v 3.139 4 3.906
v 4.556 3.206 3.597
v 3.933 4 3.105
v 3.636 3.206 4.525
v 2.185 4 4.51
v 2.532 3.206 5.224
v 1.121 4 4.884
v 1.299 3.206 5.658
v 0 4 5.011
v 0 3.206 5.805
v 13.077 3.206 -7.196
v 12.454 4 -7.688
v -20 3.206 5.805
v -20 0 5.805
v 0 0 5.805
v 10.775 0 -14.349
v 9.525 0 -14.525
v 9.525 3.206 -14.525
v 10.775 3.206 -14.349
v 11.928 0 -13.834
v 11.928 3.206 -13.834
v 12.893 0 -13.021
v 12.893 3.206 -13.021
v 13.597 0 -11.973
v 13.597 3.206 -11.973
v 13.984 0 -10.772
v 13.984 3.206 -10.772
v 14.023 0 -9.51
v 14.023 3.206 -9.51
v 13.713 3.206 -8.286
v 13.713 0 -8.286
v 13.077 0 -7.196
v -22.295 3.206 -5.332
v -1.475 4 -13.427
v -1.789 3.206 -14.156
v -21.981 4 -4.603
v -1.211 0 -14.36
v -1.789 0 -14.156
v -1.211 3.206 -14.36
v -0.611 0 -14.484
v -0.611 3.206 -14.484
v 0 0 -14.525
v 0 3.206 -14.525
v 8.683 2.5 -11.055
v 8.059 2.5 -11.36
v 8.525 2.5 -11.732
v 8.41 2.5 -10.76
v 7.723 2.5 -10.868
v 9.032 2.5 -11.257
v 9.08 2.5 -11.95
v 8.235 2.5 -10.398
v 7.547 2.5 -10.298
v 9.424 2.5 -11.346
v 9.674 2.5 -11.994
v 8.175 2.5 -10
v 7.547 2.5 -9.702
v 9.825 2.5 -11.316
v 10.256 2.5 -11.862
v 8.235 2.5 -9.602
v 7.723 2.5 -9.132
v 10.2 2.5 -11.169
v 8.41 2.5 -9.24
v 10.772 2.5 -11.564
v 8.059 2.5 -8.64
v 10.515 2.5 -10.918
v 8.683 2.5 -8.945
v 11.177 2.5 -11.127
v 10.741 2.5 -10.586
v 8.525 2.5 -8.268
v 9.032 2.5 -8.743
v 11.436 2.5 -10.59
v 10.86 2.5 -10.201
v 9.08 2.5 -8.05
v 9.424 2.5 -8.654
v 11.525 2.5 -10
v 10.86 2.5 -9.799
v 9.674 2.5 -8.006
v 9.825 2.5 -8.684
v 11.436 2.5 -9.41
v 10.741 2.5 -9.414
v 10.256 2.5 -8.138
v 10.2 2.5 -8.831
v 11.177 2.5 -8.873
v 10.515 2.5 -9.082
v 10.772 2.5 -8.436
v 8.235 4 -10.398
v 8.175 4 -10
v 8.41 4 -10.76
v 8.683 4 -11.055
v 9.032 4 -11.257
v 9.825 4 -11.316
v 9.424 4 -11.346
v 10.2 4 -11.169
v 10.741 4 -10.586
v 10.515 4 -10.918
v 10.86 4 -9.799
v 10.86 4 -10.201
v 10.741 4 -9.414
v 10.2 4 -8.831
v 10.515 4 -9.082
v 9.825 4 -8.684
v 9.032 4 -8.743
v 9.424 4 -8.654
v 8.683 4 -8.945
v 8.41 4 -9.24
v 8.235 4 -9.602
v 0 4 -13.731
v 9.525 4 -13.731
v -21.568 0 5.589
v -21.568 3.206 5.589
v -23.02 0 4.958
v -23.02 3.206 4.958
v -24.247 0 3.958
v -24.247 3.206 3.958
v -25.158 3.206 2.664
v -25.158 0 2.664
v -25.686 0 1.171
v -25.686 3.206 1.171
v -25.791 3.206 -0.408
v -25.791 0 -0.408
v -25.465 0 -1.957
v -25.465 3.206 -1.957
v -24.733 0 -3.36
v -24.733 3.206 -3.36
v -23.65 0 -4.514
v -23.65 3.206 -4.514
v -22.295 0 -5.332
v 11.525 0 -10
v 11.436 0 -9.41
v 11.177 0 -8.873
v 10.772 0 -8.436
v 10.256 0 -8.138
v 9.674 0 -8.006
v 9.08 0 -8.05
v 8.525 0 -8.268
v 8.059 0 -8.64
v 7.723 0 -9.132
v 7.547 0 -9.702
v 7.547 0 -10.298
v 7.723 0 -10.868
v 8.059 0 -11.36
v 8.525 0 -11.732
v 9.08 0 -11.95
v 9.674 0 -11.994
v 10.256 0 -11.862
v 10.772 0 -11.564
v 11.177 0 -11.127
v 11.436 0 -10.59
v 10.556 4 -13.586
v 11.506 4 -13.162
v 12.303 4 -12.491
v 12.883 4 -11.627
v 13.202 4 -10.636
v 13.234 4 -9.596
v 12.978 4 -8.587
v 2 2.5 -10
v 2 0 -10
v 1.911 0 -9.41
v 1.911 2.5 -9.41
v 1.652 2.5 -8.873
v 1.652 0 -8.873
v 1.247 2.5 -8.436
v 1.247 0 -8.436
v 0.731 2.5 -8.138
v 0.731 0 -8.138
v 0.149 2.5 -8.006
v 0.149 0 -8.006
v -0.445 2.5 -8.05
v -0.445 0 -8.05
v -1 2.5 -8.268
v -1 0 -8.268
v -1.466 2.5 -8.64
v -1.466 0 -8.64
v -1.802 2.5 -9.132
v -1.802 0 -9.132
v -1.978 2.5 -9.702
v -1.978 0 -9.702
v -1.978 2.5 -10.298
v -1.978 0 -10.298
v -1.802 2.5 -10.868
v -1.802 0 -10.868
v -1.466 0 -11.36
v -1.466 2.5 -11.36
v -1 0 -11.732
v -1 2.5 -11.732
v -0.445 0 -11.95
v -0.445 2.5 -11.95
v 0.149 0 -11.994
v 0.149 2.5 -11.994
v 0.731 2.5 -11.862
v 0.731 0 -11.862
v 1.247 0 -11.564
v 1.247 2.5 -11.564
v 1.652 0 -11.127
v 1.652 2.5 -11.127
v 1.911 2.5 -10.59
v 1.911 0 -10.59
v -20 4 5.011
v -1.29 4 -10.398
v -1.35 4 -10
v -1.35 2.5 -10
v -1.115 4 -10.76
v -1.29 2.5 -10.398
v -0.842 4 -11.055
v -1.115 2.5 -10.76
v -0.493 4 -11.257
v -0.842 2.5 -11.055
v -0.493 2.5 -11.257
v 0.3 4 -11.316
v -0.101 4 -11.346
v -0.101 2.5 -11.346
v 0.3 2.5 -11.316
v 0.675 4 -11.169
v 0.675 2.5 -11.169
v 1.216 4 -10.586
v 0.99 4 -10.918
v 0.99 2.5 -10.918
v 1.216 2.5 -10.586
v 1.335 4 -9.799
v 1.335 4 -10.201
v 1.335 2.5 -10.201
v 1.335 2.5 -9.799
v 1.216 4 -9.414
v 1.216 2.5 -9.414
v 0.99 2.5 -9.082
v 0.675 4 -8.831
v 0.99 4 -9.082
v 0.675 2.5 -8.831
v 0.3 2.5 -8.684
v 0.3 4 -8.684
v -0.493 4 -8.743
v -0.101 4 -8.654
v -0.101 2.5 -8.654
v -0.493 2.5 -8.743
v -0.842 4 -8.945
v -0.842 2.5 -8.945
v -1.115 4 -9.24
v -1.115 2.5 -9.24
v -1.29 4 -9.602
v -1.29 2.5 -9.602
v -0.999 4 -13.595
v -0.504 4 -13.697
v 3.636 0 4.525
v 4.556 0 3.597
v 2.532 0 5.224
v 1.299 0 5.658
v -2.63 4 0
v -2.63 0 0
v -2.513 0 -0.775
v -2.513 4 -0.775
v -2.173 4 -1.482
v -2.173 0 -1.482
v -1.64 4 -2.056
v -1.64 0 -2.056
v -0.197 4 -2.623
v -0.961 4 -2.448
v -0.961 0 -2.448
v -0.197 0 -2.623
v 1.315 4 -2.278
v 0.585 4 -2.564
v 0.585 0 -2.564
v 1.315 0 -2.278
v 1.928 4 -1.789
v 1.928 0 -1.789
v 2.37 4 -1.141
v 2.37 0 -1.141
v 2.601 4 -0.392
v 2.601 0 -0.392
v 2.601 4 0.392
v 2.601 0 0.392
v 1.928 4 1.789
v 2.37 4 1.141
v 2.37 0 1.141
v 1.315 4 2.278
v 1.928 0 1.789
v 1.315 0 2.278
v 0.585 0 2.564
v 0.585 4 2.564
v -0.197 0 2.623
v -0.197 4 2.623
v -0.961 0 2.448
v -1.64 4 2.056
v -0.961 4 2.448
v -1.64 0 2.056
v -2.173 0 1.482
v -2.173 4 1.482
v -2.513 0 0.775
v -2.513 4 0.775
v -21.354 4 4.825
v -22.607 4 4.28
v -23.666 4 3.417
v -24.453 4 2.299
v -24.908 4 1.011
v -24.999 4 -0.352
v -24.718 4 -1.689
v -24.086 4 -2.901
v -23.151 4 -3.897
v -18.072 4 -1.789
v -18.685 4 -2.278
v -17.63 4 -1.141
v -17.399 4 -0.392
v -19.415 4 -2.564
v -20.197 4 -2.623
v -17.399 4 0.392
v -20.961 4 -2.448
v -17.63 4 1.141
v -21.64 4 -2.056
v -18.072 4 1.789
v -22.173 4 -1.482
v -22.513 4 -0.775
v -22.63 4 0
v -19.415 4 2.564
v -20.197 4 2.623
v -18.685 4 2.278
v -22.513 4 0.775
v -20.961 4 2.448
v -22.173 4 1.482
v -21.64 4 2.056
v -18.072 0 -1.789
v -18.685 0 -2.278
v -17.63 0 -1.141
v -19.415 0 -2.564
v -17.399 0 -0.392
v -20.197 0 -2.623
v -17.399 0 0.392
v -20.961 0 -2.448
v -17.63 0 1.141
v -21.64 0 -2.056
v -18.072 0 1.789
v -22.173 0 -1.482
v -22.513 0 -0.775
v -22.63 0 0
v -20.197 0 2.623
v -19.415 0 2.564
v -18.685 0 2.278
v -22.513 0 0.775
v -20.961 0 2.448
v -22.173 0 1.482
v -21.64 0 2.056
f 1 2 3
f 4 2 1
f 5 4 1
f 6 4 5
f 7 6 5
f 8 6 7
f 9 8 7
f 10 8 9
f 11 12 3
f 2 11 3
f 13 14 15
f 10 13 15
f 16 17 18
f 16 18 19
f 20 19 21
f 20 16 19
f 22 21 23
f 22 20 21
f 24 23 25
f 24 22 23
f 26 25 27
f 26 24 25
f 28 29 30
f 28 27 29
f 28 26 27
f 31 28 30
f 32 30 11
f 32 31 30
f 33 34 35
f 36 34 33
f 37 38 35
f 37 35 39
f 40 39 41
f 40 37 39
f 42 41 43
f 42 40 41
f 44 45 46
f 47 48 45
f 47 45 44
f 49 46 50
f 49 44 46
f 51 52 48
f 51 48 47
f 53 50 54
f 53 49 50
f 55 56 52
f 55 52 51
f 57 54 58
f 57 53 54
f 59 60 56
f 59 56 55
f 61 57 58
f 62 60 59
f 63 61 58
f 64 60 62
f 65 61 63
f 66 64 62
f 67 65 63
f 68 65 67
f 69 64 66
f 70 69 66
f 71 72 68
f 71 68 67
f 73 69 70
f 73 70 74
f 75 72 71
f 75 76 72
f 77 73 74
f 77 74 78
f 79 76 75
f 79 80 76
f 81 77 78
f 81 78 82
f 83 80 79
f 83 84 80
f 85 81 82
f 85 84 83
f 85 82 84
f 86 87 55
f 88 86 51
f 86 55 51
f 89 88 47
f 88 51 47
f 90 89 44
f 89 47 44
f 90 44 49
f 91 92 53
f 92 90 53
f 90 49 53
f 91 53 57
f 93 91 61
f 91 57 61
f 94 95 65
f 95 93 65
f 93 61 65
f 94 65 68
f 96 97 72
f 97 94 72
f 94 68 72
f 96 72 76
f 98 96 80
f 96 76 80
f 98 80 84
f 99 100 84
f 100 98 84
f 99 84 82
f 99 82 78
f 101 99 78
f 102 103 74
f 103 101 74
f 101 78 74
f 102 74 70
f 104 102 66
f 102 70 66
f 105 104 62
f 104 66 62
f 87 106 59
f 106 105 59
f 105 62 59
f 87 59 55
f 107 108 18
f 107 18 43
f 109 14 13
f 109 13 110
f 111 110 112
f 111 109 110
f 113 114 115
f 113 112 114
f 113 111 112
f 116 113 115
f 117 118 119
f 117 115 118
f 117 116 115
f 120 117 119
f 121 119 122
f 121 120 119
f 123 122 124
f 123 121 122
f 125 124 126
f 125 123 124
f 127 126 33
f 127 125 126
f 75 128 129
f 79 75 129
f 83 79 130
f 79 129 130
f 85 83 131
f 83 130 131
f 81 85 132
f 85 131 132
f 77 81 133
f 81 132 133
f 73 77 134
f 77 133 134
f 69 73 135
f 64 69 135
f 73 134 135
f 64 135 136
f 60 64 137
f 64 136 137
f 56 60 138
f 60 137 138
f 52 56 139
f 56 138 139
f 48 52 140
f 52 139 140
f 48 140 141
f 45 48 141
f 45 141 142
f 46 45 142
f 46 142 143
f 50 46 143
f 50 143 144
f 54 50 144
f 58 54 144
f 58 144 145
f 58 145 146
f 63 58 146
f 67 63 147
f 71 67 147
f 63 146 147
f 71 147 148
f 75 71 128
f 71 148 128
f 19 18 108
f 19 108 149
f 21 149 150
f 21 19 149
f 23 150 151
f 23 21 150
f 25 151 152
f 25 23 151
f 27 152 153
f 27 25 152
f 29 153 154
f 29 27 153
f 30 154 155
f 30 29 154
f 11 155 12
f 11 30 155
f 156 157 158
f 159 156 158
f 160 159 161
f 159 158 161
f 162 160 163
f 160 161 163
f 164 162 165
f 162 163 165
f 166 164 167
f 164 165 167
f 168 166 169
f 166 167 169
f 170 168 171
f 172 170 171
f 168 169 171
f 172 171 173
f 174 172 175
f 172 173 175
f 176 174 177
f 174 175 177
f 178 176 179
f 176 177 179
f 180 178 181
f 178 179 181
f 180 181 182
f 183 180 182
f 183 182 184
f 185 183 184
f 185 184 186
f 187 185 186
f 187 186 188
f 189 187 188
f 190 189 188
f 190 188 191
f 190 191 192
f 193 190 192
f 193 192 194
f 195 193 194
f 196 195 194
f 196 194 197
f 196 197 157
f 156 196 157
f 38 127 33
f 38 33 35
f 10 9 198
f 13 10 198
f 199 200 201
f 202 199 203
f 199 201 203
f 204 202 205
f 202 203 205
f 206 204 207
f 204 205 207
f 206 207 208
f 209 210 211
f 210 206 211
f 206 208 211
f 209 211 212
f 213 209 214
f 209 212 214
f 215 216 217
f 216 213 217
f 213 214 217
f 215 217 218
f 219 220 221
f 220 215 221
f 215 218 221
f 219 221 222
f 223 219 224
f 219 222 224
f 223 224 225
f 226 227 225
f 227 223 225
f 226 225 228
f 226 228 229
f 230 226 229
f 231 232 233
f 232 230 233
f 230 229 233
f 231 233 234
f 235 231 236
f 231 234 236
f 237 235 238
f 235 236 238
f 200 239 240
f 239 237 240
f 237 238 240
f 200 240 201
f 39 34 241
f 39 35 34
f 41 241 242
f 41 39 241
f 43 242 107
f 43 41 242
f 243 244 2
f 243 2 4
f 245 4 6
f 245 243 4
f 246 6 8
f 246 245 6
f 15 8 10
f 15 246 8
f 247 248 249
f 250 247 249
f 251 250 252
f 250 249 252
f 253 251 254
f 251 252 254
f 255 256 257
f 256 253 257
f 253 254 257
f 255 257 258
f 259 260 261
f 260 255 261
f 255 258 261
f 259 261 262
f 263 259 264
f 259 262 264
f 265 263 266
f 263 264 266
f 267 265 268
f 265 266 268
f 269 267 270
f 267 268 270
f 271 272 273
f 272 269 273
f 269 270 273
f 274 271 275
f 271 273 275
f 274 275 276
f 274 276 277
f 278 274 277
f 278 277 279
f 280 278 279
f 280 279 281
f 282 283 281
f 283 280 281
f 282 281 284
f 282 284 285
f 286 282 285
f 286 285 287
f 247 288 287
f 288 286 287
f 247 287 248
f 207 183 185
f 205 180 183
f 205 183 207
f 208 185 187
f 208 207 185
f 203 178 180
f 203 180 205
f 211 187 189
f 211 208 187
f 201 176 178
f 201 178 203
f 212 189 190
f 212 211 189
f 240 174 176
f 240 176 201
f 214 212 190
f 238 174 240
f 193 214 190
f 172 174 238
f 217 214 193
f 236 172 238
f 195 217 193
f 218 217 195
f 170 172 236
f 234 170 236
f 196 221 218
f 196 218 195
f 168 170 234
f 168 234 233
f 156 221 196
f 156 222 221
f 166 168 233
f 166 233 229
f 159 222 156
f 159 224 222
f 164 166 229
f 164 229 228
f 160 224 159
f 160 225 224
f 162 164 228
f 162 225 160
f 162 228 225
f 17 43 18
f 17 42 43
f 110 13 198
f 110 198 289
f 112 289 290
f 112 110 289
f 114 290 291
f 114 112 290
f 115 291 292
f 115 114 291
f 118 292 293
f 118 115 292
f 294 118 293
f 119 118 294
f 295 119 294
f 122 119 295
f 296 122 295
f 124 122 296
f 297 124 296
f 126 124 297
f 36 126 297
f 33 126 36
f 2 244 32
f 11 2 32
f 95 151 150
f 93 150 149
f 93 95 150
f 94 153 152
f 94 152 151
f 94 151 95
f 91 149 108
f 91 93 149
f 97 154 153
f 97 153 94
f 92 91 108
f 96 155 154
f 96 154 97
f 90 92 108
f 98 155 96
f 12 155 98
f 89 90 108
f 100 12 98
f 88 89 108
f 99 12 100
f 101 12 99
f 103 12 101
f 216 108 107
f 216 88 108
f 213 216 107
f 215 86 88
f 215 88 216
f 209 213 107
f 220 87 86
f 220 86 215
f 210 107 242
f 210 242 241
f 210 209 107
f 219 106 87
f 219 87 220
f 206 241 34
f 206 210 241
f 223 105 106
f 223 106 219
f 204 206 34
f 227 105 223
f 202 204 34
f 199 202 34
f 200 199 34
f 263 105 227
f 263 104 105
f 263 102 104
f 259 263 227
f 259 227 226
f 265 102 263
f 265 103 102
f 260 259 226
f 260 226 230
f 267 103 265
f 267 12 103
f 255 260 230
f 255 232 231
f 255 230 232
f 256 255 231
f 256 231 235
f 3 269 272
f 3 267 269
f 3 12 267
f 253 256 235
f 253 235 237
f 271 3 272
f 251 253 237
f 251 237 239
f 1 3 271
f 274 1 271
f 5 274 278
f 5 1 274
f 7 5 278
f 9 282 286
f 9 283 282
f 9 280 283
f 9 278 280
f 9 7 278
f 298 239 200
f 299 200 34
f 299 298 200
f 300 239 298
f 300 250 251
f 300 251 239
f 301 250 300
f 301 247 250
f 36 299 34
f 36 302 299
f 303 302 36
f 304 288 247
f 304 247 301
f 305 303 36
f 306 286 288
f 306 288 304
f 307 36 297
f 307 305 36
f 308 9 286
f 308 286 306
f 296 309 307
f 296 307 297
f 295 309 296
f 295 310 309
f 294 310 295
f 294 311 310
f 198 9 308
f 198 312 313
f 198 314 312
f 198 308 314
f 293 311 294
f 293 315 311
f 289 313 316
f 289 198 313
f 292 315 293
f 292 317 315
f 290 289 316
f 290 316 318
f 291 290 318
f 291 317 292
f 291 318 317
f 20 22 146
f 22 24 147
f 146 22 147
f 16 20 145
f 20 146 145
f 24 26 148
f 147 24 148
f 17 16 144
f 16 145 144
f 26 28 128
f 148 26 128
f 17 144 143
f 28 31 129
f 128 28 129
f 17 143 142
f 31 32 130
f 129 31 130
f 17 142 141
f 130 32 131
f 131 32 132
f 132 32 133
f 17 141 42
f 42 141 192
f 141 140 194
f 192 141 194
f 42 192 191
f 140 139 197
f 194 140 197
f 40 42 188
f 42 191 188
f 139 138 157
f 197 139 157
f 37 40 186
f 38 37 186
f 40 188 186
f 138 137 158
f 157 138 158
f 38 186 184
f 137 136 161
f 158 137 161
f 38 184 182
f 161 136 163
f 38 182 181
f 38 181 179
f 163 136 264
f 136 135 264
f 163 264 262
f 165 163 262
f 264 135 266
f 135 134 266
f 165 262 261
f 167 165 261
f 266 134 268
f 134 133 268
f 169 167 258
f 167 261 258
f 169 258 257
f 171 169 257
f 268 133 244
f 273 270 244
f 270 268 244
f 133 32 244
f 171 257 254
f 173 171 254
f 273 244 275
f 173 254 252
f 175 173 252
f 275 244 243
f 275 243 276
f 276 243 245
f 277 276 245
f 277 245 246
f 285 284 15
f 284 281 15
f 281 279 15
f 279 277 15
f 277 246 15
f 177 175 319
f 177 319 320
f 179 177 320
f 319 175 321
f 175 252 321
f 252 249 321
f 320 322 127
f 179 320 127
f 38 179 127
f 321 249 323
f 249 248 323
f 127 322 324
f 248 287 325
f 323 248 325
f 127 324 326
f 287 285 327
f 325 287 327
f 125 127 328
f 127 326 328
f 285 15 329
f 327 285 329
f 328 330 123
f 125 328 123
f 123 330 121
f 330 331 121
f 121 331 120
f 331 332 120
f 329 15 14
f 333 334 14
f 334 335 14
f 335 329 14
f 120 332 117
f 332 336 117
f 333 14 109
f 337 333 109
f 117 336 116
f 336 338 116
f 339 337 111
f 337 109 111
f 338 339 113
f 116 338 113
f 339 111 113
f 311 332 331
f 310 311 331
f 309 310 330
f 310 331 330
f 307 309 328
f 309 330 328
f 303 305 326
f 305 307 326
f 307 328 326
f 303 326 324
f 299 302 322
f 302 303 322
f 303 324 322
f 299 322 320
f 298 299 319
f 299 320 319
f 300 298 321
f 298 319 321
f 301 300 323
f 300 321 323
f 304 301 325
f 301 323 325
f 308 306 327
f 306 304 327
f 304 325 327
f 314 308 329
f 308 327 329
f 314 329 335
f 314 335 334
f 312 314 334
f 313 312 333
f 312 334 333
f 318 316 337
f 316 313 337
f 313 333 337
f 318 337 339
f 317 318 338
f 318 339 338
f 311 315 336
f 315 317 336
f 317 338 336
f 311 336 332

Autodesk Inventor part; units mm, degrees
ref_plane "YZ Plane" through (0, 0, 0) normal (1, 0, 0) x (0, 1, 0)
ref_plane "XZ Plane" through (0, 0, 0) normal (0, 1, 0) x (-1, 0, 0)
ref_plane "XY Plane" through (0, 0, 0) normal (0, 0, 1) x (1, 0, 0)
sketch "Sketch1" plane through (0, 0, 0) normal (0, 1, 0) x (-1, 0, 0)
  circle A0 centre (0, 0) radius 2.63
  line L0 (0, 0) -> (0, -2.63) construction
  line L1 (0, 0) -> (2.63, 0) construction
  circle A1 centre (20, 0) radius 2.63
  circle A2 centre (0, -10) radius 1.35
  circle A3 centre (-9.525, -10) radius 1.35
  circle A4 centre (20, 0) radius 5.805 construction
  circle A5 centre (0, 0) radius 5.805 construction
  circle A6 centre (0, -10) radius 4.525 construction
  circle A7 centre (-9.525, -10) radius 4.525 construction
  line L2 (-4.5564, 3.5969) -> (-13.0767, -7.1962)
  line L3 (22.2946, -5.3322) -> (1.7886, -14.1565)
  line L4 (20, 5.805) -> (0, 5.805)
  line L5 (0, -14.525) -> (-9.525, -14.525)
  arc A8 (22.2946, -5.3322) -> (20, 5.805) centre (20, 0) ccw
  arc A9 (0, 5.805) -> (-4.5564, 3.5969) centre (0, 0) ccw
  arc A10 (0, -14.525) -> (1.7886, -14.1565) centre (0, -10) ccw
  arc A11 (-13.0767, -7.1962) -> (-9.525, -14.525) centre (-9.525, -10) ccw
  point P0 (-13.5097, -12.8558)
  dimension "d0" = 5.26
  dimension "d1" = 20
  dimension "d2" = 2.7
  dimension "d3" = 10
  dimension "d4" = 9.525
  dimension "d5" = 3.175
  dimension "d6" = 3.175
extrude "Extrusion1" add sketch "Sketch1" along normal blind 4
sketch "Sketch2" plane through (0, 0, 0) normal (0, -1, 0) x (1, 0, 0)
  line L0 (-20, 5.805) -> (0, 5.805) projected
  arc A0 (-20, 5.805) -> (-22.2946, -5.3322) centre (-20, 0) ccw projected
  line L1 (-1.7886, -14.1565) -> (-22.2946, -5.3322) projected
  arc A1 (-1.7886, -14.1565) -> (0, -14.525) centre (0, -10) ccw projected
  line L2 (9.525, -14.525) -> (0, -14.525) projected
  arc A2 (9.525, -14.525) -> (13.0767, -7.1962) centre (9.525, -10) ccw projected
  line L3 (4.5564, 3.5969) -> (13.0767, -7.1962) projected
  arc A3 (4.5564, 3.5969) -> (0, 5.805) centre (0, 0) ccw projected
  circle A4 centre (-20, 0) radius 2.63 projected
  circle A5 centre (9.525, -10) radius 1.35 projected
  circle A6 centre (0, -10) radius 1.35 projected
  circle A7 centre (0, 0) radius 2.63 projected
  circle A8 centre (9.525, -10) radius 2
  circle A9 centre (0, -10) radius 2
  dimension "d9" = 4
extrude "Extrusion2" cut sketch "Sketch2" against normal blind 2.5 contours A8 | A9
chamfer "Chamfer1" distance 0.7937 angle 45 8 edges at (-10, 4, 5.805) (2.5316, 4, 5.2239) (8.8165, 4, -1.7997) (13.597, 4, -11.9734) (4.7625, 4, -14.525) (-0.9131, 4, -14.4319) (-12.0416, 4, -9.7444) (-25.6856, 4, 1.1714)
properties part number "CNC-010-XAxisLimitSwitchMount" material "ABS Plastic"
